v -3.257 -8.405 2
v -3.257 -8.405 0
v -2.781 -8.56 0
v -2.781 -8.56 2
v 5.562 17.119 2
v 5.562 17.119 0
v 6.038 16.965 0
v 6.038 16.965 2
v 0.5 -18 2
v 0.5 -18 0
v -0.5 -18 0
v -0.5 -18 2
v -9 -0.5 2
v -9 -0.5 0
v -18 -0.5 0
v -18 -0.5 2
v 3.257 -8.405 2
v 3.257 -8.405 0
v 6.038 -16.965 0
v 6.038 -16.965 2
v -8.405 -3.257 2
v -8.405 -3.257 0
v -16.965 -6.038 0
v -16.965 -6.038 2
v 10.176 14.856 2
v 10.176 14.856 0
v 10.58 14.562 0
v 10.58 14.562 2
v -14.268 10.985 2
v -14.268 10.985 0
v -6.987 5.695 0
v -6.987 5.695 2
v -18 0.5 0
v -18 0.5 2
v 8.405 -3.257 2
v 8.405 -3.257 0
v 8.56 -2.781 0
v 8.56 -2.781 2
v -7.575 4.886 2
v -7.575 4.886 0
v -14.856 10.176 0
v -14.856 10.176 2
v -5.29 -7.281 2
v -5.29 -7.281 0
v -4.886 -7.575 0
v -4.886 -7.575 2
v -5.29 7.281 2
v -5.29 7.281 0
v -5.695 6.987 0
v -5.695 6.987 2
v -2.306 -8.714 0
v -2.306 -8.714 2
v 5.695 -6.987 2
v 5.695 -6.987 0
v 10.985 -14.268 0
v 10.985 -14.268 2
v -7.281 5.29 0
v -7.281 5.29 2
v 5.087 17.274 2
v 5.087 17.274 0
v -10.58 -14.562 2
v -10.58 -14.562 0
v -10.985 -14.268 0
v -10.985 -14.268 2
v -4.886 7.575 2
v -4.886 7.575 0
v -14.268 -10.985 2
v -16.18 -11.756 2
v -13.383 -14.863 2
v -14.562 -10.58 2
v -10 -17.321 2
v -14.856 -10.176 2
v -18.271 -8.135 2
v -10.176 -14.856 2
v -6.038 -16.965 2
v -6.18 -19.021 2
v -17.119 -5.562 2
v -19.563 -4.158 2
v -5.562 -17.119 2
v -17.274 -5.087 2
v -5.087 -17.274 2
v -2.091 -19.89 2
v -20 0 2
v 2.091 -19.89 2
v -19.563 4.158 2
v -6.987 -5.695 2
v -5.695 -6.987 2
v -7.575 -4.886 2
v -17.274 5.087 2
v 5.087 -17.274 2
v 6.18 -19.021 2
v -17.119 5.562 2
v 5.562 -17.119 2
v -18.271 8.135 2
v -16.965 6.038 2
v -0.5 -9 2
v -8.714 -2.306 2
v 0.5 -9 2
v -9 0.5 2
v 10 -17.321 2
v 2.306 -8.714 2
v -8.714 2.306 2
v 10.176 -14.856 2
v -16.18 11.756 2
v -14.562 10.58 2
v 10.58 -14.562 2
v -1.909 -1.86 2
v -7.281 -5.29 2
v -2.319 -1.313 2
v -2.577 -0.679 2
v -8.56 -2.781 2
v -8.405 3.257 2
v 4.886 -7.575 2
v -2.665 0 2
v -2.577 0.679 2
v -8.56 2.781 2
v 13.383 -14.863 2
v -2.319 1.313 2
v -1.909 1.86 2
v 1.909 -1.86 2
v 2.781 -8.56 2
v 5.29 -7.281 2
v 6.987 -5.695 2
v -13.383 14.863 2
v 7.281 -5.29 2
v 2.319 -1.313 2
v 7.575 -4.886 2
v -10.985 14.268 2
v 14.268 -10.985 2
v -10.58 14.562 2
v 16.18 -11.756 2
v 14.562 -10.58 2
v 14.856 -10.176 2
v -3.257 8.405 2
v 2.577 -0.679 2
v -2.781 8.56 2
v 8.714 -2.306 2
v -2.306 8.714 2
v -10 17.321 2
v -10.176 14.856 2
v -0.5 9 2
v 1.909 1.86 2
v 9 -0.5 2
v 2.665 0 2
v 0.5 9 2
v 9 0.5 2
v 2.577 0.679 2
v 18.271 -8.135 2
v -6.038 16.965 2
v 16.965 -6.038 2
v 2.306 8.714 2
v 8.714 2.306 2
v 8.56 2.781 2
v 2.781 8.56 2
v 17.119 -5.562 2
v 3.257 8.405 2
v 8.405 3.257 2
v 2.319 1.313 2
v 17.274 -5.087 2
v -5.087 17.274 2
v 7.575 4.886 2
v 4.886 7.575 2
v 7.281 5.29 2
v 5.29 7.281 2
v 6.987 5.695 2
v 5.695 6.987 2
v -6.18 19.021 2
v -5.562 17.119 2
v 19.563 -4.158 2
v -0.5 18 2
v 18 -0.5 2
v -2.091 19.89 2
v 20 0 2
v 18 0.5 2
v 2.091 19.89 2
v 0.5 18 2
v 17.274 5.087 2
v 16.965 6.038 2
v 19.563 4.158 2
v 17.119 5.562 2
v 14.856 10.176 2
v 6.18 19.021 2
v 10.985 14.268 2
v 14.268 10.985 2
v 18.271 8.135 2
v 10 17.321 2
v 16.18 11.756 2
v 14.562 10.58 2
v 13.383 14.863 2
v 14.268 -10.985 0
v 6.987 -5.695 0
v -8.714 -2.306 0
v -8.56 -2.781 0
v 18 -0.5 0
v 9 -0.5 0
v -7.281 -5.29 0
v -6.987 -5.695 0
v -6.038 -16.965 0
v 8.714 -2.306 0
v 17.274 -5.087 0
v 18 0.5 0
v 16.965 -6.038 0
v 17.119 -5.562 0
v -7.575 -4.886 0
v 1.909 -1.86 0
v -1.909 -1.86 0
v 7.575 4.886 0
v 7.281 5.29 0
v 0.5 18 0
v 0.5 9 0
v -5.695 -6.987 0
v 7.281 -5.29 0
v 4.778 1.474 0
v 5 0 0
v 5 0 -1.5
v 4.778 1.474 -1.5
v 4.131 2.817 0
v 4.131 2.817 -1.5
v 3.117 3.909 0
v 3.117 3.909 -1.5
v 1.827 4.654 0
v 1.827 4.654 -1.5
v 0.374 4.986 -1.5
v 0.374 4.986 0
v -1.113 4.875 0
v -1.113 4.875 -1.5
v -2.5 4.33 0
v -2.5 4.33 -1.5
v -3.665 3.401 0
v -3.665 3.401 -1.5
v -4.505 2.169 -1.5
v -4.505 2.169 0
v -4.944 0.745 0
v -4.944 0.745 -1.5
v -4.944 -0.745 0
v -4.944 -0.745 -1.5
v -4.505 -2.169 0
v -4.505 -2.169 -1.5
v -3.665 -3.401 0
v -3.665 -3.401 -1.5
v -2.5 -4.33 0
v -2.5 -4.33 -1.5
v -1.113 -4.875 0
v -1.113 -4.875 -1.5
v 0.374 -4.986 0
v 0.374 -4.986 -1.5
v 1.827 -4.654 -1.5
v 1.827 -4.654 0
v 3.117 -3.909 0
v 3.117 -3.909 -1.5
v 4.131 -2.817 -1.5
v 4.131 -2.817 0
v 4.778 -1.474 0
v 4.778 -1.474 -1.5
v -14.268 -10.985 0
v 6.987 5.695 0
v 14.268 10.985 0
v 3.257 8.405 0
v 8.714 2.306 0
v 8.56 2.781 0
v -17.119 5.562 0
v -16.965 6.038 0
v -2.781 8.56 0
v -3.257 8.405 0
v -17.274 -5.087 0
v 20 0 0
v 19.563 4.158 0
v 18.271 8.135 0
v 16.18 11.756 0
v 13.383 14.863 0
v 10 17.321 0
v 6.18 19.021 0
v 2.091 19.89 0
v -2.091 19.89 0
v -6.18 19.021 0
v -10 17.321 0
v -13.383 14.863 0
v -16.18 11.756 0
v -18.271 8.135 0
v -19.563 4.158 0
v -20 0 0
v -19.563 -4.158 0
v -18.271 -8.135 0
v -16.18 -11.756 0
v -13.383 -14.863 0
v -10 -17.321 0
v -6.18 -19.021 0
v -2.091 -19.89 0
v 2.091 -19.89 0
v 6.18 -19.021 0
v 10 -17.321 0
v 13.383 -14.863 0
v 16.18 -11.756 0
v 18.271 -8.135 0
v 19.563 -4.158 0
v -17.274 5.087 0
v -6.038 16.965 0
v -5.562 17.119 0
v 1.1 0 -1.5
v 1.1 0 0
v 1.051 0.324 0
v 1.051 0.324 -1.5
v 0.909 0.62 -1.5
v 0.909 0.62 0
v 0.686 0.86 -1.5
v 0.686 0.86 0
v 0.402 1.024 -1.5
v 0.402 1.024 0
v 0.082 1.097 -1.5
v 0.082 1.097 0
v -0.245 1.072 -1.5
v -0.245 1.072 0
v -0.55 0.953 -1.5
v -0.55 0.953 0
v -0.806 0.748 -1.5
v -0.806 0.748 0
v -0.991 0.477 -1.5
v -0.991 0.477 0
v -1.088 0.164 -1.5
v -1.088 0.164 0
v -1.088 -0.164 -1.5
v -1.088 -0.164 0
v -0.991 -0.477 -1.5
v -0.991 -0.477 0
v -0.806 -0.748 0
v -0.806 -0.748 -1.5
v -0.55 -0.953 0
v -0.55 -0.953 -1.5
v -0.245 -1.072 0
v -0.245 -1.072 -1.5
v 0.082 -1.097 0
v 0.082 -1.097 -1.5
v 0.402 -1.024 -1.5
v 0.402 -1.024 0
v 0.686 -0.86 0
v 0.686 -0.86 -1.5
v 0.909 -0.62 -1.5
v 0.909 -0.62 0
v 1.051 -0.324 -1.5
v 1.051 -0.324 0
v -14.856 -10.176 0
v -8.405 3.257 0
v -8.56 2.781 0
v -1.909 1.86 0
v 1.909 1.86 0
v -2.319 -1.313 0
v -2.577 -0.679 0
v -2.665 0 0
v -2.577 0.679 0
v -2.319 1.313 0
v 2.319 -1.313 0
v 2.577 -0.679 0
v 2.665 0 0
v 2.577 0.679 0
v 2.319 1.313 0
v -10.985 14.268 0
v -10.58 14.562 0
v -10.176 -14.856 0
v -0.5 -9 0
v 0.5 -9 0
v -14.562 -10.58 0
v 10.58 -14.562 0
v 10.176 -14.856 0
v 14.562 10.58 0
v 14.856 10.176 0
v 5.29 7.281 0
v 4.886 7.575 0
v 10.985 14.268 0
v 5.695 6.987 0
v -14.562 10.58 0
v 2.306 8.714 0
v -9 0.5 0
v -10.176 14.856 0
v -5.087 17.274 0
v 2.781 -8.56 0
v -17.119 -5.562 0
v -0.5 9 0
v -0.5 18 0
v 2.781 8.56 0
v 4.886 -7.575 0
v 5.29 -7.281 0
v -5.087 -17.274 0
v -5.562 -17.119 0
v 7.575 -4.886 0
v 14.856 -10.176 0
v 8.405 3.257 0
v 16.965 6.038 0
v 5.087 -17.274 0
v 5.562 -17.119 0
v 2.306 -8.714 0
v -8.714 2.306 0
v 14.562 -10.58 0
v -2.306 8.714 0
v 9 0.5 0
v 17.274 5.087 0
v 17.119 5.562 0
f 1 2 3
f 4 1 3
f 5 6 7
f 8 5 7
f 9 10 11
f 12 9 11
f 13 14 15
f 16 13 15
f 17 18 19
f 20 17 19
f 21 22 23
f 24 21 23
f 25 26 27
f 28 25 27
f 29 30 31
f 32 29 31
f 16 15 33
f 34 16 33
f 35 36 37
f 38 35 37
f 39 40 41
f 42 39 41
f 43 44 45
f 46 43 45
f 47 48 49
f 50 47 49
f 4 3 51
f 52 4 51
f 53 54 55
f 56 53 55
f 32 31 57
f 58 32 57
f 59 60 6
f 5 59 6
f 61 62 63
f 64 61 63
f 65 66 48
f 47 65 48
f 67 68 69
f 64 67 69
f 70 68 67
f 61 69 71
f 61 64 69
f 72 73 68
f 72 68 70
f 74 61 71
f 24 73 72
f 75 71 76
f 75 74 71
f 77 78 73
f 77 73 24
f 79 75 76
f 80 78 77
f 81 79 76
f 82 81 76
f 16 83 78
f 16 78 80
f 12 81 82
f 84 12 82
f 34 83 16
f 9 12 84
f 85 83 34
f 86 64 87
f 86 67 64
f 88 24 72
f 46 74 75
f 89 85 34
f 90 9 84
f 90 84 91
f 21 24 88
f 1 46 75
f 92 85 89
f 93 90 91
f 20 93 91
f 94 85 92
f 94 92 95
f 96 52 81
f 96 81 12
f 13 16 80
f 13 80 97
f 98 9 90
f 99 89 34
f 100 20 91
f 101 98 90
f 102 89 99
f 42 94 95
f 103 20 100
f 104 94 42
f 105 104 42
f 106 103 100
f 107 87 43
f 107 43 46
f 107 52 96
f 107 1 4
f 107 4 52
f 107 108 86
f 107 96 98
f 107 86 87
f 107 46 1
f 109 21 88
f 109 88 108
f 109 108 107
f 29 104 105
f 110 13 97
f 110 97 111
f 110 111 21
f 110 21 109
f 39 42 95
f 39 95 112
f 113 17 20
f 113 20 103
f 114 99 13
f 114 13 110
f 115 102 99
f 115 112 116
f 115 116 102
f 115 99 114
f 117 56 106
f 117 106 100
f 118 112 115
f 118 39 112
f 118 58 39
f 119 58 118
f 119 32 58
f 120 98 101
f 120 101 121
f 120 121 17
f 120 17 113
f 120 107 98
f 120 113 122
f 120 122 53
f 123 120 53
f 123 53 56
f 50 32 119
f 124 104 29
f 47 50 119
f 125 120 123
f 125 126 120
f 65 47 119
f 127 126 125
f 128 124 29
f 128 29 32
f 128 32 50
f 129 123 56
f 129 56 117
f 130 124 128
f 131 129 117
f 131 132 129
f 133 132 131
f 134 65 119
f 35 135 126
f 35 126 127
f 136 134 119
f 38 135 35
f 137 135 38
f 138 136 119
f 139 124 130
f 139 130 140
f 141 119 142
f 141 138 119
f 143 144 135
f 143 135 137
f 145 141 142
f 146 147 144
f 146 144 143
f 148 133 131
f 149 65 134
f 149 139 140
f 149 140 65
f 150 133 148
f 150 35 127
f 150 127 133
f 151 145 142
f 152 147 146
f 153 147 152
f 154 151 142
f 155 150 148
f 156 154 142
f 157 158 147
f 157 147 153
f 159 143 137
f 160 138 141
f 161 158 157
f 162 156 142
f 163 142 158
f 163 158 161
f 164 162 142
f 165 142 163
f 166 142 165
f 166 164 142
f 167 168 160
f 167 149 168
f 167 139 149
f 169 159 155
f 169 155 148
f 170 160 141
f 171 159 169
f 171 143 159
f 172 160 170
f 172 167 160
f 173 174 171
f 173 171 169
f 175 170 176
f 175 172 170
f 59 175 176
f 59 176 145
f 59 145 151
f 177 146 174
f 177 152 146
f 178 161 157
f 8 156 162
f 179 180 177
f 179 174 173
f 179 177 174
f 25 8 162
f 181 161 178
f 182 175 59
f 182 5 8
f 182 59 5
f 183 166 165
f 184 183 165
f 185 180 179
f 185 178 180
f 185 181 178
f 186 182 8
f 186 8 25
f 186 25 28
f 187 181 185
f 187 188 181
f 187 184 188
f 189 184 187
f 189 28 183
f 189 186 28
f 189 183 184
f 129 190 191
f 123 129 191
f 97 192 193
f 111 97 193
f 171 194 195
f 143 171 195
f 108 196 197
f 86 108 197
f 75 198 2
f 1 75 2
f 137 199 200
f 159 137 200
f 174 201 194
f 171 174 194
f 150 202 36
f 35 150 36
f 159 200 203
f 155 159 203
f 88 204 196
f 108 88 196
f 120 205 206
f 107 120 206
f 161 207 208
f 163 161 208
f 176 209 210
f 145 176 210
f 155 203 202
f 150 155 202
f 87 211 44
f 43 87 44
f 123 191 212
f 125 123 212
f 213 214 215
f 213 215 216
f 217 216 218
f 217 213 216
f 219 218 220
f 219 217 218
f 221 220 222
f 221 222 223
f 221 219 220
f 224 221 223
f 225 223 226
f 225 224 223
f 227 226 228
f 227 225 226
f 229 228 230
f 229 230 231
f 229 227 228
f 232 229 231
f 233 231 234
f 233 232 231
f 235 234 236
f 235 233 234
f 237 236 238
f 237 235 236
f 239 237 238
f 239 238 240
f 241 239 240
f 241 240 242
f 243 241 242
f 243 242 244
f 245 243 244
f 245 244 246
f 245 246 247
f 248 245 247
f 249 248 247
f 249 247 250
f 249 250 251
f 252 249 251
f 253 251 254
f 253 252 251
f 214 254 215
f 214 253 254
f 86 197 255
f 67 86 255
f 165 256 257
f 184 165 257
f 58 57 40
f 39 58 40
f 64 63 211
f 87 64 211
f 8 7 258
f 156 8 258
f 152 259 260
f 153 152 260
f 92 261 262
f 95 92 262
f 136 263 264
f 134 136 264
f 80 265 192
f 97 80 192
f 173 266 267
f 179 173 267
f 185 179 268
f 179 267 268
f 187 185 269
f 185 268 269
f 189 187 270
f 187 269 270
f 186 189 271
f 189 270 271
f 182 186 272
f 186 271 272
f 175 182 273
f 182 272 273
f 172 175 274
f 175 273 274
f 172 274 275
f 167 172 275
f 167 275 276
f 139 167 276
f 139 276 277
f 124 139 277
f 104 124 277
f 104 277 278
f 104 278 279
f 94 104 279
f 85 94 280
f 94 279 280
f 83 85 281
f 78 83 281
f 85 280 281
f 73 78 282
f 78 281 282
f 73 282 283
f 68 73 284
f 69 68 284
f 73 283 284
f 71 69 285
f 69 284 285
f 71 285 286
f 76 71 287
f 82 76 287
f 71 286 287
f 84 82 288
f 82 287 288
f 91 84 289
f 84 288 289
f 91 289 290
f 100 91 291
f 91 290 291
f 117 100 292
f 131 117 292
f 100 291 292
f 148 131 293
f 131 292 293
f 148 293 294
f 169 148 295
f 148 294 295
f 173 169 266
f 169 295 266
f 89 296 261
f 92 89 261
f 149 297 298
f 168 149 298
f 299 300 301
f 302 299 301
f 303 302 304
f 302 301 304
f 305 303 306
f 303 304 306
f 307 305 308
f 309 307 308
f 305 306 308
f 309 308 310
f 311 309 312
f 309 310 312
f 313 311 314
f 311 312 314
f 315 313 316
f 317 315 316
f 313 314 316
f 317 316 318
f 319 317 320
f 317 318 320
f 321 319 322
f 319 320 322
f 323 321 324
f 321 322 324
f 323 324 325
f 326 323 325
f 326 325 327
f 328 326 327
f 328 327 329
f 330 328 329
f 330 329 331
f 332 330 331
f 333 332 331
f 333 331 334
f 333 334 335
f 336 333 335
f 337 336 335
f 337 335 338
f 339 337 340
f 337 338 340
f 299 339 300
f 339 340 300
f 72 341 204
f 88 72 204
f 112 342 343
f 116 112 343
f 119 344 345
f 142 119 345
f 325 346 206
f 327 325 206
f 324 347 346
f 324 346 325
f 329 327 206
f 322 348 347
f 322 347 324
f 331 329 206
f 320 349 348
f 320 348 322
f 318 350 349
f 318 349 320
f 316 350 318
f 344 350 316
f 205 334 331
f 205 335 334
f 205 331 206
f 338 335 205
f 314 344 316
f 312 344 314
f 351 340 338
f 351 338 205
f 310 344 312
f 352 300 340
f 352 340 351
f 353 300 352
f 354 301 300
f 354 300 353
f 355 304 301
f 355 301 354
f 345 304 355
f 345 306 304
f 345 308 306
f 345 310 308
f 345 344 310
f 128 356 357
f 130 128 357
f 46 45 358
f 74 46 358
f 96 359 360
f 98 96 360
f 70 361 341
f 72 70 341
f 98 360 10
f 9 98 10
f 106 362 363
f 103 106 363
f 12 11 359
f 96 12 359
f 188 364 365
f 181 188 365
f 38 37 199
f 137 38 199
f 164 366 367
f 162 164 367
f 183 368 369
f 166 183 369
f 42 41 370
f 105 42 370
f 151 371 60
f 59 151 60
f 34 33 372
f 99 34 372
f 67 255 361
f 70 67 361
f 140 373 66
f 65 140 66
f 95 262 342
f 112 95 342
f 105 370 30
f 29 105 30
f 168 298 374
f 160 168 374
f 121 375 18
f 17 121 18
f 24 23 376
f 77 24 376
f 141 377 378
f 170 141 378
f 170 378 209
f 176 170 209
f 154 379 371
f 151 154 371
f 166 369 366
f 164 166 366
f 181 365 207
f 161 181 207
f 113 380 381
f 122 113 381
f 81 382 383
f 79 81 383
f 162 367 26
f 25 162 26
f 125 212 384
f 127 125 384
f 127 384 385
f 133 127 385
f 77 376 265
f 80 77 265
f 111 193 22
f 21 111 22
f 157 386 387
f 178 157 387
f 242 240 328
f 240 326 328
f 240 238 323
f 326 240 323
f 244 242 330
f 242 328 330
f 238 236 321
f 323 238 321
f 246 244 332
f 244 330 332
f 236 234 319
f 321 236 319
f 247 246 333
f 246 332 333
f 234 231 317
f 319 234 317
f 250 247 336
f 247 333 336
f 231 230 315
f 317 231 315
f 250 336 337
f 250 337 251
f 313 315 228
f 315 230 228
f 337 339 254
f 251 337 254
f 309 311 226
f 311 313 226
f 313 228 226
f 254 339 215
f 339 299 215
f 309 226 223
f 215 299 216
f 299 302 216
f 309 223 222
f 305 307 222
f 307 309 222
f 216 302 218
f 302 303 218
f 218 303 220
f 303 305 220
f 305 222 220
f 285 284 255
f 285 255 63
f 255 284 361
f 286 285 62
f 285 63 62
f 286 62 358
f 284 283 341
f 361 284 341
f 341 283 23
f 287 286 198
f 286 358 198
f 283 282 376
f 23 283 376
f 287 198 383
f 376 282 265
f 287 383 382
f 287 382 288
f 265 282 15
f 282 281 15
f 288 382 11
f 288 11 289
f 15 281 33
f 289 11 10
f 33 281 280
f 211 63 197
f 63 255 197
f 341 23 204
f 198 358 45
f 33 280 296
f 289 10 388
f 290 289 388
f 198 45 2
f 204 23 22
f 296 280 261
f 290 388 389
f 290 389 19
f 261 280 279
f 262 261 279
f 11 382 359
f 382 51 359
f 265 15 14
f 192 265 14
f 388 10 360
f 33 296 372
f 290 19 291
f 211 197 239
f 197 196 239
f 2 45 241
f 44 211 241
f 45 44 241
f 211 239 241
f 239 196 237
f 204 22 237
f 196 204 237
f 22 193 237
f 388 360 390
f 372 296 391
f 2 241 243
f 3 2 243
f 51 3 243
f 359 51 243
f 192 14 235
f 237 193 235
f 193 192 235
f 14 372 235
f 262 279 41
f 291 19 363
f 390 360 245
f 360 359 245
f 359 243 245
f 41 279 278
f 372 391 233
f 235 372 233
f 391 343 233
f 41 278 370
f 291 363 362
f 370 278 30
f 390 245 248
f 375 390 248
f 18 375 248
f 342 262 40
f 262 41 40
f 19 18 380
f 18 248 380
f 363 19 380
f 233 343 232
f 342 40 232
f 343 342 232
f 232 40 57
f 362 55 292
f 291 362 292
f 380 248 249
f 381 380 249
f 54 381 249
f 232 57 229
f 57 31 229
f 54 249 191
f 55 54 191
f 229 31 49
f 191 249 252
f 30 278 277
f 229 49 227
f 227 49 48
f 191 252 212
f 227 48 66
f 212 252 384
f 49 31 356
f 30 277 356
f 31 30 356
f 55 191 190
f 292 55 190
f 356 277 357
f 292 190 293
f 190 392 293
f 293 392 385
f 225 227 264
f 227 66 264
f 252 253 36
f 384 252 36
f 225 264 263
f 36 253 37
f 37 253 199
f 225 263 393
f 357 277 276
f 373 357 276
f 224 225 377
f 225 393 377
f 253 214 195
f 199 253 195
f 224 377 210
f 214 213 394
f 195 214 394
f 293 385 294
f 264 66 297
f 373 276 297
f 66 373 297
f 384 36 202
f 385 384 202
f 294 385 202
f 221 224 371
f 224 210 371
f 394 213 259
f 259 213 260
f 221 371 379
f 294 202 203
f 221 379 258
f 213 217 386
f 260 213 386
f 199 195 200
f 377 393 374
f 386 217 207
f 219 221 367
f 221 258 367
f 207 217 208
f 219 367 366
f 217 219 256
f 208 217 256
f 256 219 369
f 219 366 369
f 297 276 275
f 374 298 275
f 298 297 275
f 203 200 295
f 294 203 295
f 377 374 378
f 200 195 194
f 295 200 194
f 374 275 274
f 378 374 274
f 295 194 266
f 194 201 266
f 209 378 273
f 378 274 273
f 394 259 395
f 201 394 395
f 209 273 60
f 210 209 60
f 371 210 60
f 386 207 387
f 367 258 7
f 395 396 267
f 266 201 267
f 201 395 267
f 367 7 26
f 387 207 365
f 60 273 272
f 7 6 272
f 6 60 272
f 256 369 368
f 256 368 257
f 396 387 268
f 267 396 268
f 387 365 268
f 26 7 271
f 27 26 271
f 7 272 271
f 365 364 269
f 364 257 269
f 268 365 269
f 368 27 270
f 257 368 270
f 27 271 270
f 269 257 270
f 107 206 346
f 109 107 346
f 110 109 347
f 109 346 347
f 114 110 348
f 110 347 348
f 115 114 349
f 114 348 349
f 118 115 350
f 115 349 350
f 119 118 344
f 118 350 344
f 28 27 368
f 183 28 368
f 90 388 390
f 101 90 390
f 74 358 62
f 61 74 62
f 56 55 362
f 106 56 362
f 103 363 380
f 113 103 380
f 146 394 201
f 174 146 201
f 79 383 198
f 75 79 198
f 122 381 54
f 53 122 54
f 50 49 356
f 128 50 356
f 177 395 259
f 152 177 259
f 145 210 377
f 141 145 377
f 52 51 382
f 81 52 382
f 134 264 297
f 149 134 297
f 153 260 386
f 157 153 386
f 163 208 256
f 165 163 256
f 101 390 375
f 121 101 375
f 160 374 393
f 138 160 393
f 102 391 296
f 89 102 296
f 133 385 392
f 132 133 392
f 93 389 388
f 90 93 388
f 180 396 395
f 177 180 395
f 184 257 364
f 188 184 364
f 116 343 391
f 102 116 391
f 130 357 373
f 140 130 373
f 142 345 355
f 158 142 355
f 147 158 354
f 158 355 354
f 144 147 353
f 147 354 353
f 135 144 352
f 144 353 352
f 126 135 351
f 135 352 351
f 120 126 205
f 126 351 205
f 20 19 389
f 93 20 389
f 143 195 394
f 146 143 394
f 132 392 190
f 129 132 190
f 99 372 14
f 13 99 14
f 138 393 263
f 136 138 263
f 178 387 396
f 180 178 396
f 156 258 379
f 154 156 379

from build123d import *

# Parameters (mm, degrees)
F0_R     = 20
F1_DEPTH = 2
F2_R     = 5
F2_R_2   = 1.1
F3_DEPTH = 1.5


with BuildPart() as f1:
    # F0 (on Top) → F1 (new body)
    with BuildSketch(Plane.XY):
        Circle(F0_R)
        Polygon((-10.984643, -14.268413), (-5.694576, -6.98726), (-5.290067, -7.281153), (-4.885559, -7.575046), (-10.175626, -14.856199), (-10.580135, -14.562306), align=None, mode=Mode.SUBTRACT)
        Polygon((-6.037834, -16.964509), (-3.256681, -8.405), (-2.781153, -8.559509), (-2.305625, -8.714017), (-5.086778, -17.273526), (-5.562306, -17.119017), align=None, mode=Mode.SUBTRACT)
        Polygon((-14.856199, -10.175626), (-7.575046, -4.885559), (-7.281153, -5.290067), (-6.98726, -5.694576), (-14.268413, -10.984643), (-14.562306, -10.580135), align=None, mode=Mode.SUBTRACT)
        Polygon((-17.273526, -5.086778), (-8.714017, -2.305625), (-8.559509, -2.781153), (-8.405, -3.256681), (-16.964509, -6.037834), (-17.119017, -5.562306), align=None, mode=Mode.SUBTRACT)
        Polygon((-0.5, -9), (0, -9), (0.5, -9), (0.5, -18), (0, -18), (-0.5, -18), align=None, mode=Mode.SUBTRACT)
        Polygon((5.086778, -17.273526), (2.305625, -8.714017), (2.781153, -8.559509), (3.256681, -8.405), (6.037834, -16.964509), (5.562306, -17.119017), align=None, mode=Mode.SUBTRACT)
        Polygon((10.175626, -14.856199), (4.885559, -7.575046), (5.290067, -7.281153), (5.694576, -6.98726), (10.984643, -14.268413), (10.580135, -14.562306), align=None, mode=Mode.SUBTRACT)
        Polygon((14.268413, -10.984643), (6.98726, -5.694576), (7.281153, -5.290067), (7.575046, -4.885559), (14.856199, -10.175626), (14.562306, -10.580135), align=None, mode=Mode.SUBTRACT)
        Polygon((16.964509, -6.037834), (8.405, -3.256681), (8.559509, -2.781153), (8.714017, -2.305625), (17.273526, -5.086778), (17.119017, -5.562306), align=None, mode=Mode.SUBTRACT)
        Polygon((-18, 0.5), (-9, 0.5), (-9, 0), (-9, -0.5), (-18, -0.5), (-18, 0), align=None, mode=Mode.SUBTRACT)
        Polygon((-16.964509, 6.037834), (-8.405, 3.256681), (-8.559509, 2.781153), (-8.714017, 2.305625), (-17.273526, 5.086778), (-17.119017, 5.562306), align=None, mode=Mode.SUBTRACT)
        Polygon((-14.268413, 10.984643), (-6.98726, 5.694576), (-7.281153, 5.290067), (-7.575046, 4.885559), (-14.856199, 10.175626), (-14.562306, 10.580135), align=None, mode=Mode.SUBTRACT)
        Polygon((-10.175626, 14.856199), (-4.885559, 7.575046), (-5.290067, 7.281153), (-5.694576, 6.98726), (-10.984643, 14.268413), (-10.580135, 14.562306), align=None, mode=Mode.SUBTRACT)
        Polygon((-5.086778, 17.273526), (-2.305625, 8.714017), (-2.781153, 8.559509), (-3.256681, 8.405), (-6.037834, 16.964509), (-5.562306, 17.119017), align=None, mode=Mode.SUBTRACT)
        with BuildLine():
            ThreePointArc((-1.908566, -1.86), (-2.665, 0), (-1.908566, 1.86))
            Line((-1.908566, 1.86), (1.908566, 1.86))
            ThreePointArc((1.908566, 1.86), (2.665, 0), (1.908566, -1.86))
            Line((1.908566, -1.86), (-1.908566, -1.86))
        make_face(mode=Mode.SUBTRACT)
        Polygon((18, -0.5), (9, -0.5), (9, 0), (9, 0.5), (18, 0.5), (18, 0), align=None, mode=Mode.SUBTRACT)
        Polygon((17.273526, 5.086778), (8.714017, 2.305625), (8.559509, 2.781153), (8.405, 3.256681), (16.964509, 6.037834), (17.119017, 5.562306), align=None, mode=Mode.SUBTRACT)
        Polygon((14.856199, 10.175626), (7.575046, 4.885559), (7.281153, 5.290067), (6.98726, 5.694576), (14.268413, 10.984643), (14.562306, 10.580135), align=None, mode=Mode.SUBTRACT)
        Polygon((0.5, 18), (0.5, 9), (0, 9), (-0.5, 9), (-0.5, 18), (0, 18), align=None, mode=Mode.SUBTRACT)
        Polygon((6.037834, 16.964509), (3.256681, 8.405), (2.781153, 8.559509), (2.305625, 8.714017), (5.086778, 17.273526), (5.562306, 17.119017), align=None, mode=Mode.SUBTRACT)
        Polygon((10.984643, 14.268413), (5.694576, 6.98726), (5.290067, 7.281153), (4.885559, 7.575046), (10.175626, 14.856199), (10.580135, 14.562306), align=None, mode=Mode.SUBTRACT)
    extrude(amount=F1_DEPTH)

    # F2 (on Top) → F3 (join)
    with BuildSketch(Plane.XY):
        Circle(F2_R)
        Circle(F2_R_2, mode=Mode.SUBTRACT)
    extrude(amount=-F3_DEPTH)


solid = f1.part
